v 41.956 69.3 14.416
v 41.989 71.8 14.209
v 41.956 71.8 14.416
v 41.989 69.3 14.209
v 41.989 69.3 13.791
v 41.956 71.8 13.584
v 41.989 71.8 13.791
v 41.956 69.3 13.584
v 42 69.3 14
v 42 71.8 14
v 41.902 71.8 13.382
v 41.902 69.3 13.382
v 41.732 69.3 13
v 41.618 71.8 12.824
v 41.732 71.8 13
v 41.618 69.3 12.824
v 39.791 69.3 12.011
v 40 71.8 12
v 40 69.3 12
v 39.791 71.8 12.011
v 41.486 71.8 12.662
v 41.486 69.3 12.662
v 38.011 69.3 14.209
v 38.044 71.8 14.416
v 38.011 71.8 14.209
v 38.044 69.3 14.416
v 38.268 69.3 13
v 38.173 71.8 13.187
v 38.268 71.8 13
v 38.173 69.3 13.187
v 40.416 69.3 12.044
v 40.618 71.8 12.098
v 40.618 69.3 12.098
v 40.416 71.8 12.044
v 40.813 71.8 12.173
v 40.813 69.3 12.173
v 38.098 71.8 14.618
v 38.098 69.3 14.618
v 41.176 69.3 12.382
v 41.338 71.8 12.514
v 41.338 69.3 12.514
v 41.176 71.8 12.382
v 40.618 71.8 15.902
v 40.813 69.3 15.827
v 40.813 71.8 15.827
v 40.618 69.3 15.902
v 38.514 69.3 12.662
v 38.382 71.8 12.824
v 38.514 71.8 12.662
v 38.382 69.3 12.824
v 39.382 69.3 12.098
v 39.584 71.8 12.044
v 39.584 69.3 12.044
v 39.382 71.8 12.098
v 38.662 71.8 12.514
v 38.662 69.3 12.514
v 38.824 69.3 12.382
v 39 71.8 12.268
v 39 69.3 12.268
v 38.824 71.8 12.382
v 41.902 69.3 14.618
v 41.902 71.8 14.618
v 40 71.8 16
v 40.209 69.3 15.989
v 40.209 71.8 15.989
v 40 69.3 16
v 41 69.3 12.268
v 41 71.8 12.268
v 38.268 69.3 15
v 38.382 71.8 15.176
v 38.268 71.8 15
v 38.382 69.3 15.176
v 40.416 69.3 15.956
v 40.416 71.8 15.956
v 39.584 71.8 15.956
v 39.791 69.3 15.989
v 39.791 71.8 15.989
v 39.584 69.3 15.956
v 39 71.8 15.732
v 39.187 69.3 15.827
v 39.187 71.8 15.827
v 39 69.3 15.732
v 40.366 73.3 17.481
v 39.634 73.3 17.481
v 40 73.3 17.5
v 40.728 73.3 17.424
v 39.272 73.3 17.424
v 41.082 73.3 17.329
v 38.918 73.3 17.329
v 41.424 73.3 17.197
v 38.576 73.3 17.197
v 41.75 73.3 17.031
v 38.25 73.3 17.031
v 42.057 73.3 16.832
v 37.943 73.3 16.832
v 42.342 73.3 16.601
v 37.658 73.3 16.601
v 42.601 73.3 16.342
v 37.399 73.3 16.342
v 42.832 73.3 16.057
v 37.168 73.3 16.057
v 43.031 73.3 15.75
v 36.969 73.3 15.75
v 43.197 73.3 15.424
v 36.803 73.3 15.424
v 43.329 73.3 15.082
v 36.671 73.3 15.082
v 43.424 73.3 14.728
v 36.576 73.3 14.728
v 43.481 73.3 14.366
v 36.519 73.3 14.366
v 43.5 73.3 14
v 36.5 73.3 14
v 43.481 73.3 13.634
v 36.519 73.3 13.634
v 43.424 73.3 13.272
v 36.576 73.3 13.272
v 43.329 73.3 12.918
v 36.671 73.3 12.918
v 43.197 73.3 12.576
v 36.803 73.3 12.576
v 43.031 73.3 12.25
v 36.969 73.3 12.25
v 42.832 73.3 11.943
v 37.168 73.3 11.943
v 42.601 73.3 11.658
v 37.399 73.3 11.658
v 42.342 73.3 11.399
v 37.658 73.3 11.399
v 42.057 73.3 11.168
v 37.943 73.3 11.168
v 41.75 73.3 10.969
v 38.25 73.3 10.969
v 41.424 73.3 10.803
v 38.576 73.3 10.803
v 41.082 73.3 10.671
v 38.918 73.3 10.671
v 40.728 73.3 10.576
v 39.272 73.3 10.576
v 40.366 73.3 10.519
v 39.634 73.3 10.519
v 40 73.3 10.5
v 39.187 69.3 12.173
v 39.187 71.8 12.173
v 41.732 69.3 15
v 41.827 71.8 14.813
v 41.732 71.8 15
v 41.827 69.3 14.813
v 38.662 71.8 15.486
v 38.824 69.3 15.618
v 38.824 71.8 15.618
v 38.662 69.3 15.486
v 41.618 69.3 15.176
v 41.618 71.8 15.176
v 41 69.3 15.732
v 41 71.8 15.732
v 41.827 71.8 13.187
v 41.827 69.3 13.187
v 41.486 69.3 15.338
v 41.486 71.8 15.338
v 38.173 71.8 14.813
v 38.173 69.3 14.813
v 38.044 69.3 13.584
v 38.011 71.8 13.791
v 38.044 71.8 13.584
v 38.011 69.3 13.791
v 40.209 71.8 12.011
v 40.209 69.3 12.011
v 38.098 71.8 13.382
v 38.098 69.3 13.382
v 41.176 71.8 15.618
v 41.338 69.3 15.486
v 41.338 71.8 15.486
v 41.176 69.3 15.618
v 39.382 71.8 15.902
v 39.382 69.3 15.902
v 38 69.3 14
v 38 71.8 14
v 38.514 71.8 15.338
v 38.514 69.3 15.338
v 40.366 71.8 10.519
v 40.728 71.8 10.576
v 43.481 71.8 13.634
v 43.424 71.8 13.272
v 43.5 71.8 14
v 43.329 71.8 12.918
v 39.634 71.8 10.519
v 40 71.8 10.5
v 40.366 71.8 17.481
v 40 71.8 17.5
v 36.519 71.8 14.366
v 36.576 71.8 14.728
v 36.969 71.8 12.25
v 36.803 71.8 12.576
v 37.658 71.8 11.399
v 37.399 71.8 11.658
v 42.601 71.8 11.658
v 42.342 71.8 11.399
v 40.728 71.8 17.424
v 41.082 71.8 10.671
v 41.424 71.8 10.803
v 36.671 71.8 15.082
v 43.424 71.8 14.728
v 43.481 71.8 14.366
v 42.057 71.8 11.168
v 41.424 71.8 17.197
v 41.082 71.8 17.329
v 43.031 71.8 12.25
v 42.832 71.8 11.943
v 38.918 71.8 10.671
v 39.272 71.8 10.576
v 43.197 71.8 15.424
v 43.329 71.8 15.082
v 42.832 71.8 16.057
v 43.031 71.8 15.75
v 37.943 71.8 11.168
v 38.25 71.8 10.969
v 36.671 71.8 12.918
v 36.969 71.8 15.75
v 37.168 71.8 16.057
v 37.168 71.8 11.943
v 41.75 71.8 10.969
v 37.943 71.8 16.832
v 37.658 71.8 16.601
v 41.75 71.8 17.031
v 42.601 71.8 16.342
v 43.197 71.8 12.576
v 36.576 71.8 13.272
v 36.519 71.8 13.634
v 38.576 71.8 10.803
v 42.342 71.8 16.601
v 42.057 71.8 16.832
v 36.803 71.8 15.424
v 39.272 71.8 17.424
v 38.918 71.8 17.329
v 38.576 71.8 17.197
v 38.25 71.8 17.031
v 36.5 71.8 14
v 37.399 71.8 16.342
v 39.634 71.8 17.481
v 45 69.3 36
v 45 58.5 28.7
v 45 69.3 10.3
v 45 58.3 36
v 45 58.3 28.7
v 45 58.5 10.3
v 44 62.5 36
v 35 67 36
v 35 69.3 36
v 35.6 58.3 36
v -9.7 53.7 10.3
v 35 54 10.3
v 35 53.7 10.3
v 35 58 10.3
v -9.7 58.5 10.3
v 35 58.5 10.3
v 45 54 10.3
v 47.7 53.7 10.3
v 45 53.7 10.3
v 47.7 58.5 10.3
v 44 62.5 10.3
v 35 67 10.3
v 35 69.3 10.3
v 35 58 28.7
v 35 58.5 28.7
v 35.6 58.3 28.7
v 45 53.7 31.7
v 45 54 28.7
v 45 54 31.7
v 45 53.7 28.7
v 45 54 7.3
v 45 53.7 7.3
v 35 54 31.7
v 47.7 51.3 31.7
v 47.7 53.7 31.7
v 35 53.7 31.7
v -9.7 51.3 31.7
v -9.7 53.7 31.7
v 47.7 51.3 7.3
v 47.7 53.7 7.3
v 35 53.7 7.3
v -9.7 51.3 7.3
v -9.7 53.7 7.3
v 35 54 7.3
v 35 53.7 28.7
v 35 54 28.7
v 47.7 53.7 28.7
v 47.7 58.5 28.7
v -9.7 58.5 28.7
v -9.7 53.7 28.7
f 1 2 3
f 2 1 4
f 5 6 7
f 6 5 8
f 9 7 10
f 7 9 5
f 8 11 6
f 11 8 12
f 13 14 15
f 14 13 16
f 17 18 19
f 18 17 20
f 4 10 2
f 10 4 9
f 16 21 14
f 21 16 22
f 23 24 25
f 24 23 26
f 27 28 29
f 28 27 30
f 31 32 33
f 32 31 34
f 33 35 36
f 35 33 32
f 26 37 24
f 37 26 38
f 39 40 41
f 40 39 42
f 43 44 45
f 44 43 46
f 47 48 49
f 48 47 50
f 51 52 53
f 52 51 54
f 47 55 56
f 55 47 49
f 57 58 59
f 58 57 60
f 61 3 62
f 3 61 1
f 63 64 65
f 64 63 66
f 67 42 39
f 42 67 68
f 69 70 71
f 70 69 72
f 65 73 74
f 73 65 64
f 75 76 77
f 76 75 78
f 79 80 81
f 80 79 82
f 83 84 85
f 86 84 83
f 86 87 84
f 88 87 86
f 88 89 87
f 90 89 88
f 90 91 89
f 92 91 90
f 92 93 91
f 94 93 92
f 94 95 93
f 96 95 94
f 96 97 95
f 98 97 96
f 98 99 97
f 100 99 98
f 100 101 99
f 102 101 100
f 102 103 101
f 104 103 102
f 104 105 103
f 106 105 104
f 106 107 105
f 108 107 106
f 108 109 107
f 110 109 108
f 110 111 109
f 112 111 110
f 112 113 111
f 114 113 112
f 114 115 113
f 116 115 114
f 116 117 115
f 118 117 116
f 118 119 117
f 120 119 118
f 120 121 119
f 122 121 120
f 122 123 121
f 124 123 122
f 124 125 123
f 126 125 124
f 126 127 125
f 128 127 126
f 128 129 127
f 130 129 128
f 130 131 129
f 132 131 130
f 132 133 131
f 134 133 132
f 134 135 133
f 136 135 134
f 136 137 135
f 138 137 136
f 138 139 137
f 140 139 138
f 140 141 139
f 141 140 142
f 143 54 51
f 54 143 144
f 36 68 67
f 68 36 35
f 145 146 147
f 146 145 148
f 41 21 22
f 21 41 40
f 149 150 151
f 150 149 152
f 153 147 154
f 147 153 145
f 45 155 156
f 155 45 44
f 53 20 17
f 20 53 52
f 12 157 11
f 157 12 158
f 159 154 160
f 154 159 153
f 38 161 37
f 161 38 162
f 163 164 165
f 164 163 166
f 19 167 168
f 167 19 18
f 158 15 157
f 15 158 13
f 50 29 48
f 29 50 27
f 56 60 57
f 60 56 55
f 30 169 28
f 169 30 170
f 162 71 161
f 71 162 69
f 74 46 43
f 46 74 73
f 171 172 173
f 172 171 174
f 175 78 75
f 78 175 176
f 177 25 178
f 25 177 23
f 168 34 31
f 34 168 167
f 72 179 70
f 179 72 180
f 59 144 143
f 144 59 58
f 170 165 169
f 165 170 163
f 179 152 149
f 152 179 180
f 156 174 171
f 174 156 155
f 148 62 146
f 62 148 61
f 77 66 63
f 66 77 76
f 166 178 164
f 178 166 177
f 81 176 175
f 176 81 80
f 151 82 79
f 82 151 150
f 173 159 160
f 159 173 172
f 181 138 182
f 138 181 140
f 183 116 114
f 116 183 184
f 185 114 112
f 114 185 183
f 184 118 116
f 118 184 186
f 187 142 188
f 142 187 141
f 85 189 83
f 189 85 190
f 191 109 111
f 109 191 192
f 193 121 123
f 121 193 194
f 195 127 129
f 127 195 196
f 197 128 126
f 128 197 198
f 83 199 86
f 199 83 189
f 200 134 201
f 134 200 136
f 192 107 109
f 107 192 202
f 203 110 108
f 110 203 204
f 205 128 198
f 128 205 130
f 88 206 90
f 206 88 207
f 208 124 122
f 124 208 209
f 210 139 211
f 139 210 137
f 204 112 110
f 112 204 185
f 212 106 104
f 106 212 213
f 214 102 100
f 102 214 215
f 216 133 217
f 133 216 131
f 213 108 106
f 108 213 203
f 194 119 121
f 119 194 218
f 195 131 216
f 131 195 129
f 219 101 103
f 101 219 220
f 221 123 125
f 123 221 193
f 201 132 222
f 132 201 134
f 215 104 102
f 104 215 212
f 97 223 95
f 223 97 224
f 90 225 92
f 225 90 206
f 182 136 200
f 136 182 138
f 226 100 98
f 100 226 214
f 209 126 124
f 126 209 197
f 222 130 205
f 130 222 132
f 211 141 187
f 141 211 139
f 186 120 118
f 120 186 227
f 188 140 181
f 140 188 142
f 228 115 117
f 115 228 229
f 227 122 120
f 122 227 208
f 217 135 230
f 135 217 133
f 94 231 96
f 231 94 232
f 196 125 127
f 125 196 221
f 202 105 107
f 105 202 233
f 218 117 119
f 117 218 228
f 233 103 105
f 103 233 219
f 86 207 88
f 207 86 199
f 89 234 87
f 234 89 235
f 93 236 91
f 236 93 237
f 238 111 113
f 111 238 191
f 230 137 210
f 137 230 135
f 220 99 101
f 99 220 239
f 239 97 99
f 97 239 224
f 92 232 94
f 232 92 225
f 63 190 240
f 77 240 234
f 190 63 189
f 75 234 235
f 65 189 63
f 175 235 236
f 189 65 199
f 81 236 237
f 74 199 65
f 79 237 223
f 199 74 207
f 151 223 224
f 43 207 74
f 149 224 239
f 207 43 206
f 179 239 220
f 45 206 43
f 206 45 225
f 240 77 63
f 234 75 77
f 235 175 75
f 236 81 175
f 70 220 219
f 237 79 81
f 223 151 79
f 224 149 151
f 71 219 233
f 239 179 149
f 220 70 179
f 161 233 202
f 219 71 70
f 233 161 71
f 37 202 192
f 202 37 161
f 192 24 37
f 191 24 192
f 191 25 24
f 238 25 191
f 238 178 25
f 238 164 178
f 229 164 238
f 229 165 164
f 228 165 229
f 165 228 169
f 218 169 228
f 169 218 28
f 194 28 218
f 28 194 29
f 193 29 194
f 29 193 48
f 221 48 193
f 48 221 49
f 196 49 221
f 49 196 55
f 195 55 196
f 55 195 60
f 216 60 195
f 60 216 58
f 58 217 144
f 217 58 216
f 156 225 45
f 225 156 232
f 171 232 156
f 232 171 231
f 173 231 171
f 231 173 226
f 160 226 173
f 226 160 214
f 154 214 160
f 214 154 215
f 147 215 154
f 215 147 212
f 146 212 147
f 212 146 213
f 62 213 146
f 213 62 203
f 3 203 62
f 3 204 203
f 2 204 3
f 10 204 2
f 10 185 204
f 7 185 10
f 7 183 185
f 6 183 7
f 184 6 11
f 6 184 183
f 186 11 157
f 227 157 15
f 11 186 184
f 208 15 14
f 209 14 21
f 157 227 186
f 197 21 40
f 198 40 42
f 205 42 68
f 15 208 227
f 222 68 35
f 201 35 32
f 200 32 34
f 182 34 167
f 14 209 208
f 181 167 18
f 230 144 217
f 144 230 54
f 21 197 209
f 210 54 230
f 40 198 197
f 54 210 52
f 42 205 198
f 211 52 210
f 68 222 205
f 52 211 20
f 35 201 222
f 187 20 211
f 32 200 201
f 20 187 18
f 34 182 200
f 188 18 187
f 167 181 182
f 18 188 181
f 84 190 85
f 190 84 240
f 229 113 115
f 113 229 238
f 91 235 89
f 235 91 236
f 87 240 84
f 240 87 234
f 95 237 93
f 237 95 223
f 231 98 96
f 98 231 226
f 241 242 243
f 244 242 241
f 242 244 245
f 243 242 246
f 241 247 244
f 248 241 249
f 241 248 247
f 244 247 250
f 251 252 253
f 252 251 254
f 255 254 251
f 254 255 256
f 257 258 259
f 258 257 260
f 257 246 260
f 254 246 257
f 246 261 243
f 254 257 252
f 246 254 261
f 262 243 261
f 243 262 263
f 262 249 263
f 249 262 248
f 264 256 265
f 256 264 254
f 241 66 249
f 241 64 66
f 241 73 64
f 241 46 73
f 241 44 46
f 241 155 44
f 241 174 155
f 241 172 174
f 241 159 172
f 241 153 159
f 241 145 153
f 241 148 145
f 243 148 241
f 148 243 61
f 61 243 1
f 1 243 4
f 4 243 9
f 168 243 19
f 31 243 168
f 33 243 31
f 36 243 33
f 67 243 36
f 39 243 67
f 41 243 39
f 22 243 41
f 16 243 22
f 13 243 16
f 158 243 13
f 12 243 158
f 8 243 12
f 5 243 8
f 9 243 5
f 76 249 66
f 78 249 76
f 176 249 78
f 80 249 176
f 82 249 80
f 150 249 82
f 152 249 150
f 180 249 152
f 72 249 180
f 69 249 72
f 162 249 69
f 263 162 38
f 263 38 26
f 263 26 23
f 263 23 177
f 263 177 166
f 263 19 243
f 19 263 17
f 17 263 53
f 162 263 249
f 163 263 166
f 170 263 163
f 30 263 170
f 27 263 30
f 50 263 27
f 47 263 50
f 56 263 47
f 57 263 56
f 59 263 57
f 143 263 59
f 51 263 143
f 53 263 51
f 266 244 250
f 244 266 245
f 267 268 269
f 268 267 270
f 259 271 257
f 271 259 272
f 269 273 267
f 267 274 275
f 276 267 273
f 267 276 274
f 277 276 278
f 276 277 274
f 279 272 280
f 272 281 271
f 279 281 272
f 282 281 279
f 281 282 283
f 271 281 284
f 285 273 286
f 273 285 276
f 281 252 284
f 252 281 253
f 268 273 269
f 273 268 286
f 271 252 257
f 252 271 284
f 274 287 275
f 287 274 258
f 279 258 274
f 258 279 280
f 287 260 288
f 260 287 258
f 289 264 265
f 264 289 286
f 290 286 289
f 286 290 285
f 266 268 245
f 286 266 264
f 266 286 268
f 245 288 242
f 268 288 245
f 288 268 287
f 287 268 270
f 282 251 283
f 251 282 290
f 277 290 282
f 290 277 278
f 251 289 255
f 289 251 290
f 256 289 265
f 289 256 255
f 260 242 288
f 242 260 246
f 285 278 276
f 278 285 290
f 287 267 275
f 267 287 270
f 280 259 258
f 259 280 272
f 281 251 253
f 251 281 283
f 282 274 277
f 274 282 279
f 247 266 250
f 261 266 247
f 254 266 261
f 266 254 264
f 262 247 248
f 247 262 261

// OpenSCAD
// file: lego_robot_common.scad
/* 
 * Parametric Lego-Compatible Robotic Vehicle Enclosure
 * Completely self-contained OpenSCAD script.
 */

$fn = 60;

// --- LEGO & ENCLOSURE PARAMETERS ---
lego_pitch = 8.0;
lego_height = 9.6;
wall_t = 1.6;        // thin end walls (front/back) for electronics clearance
side_wall = 8.0;     // long side walls: a full LEGO unit so the lid seats and
                     // Technic holes/motor mounts sit in solid wall

// Outer Dimensions. Shorter + taller (reorg): the ULN2003 boards stand on the
// inner side walls and the ESP32 lies between them, so the floor needs less
// length; the extra height lets the phone clamp grip higher.
box_w_lu = 12; // 96.0 mm (Outer Width)
box_l_lu = 12; // 96.0 mm (Outer Length, shortened from 128)
box_h_lh = 6;  // 57.6 mm (Outer Height, raised from 48)

width = box_w_lu * lego_pitch;
length = box_l_lu * lego_pitch;
height = box_h_lh * lego_height;

lid_t = 3.2; // Sliding lid thickness
floor_z = 4.8; // 3.2mm Lego tube cavity + 1.6mm floor
lid_z = height - 2.4; // centre Z of the sliding-lid rail groove (just below top)

// --- ALIGNED INTERNAL POSITIONS ---
shaft_z = 33.6; // motor shaft / coupler height
motor_y = 26.0; // front; keeps the front mounting ear (motor_y+17.5) inside the cavity
motor_z = shaft_z - 8.0;

// --- PHONE CLAMP T-SLOT (shared by the base cavity + the moving jaw tongue) ---
// Keeping these numbers in one place stops the two parts drifting out of
// sync -- a past edit shrank the cavity without updating the tongue to
// match, letting the tongue reach 20mm past the cavity into solid wall.
clamp_tol    = 0.3;        // per-side print clearance for the sliding tongue fit
slot_x0      = -10;        // T-slot cavity start (chassis X)
slot_x1      = width / 2;  // T-slot cavity end == chassis half-width
slot_neck_z0 = 10;  slot_neck_z1 = 29;  // neck cavity Z range (jaw slides here)
slot_uc_z0   = 7;   slot_uc_z1   = 32;  // undercut cavity Z range (T-flange lock)
shelf_top_z  = 8;          // V-lip shelf top surface -- jaw geometry must clear this
// Shared Z height for both band pegs (keeps rubber band level). Must clear
// the moving jaw's grip finger floor (slot_neck_z0 + clamp_tol = 10.3) by
// enough for the d=4 peg shaft (radius 2) to stay embedded in it.
band_peg_z   = 14;

// --- PRINTABILITY HELPERS ---
// Self-supporting "teardrop" profile for a horizontal round hole: circular
// for the bottom ~180-270 degrees (so a mating round part still fits/seats
// normally), pointed above that so no internal roof ever needs to bridge
// across the hole -- avoids drooping/support for holes above ~5-8mm, which
// plain horizontal cylinder() holes need past that size.
// Bores along X, apex always toward +Z regardless of s (+1 or -1), matching
// the translate/rotate([0, s*90, 0]) convention already used for the plain
// cylinder() holes elsewhere in this project.
module teardrop_hole(d, h, s = 1) {
    r = d / 2;
    a = r / sqrt(2); // circle's 45-degree point -- where the roof takes over
    rotate([0, 0, s * 90]) rotate([90, 0, 0])
        linear_extrude(h)
            union() {
                circle(d = d);
                polygon([[-a, a], [a, a], [0, r * sqrt(2)]]);
            }
}

// --- RENDER TARGET ---
// main file
include <lego_robot_common.scad>

// Adjustable RIGHT V-jaw for the horizontal phone clamp.
//
// Rides the T-slot on the front face of the chassis clamp-wall (y=48-58).
// Telescope right to load phone; slide left until V-notch grips right edge.
// T-tongue (neck + full undercut) locks the jaw in Y so it cannot pull
// forward — only slides in X along the rail. The tongue's X span is derived
// from slot_x0/slot_x1 (lego_robot_common.scad) minus clamp_tol, so it can
// never reach past the chassis's actual T-slot cavity into solid wall.
// Band peg on jaw front face: hook rubber band before inserting phone.
// Prints standing (tongue face down), no support needed.

module phone_clamp_jaw() {
    fy  = length / 2;    // chassis front wall inner face (y=48)
    tol = clamp_tol;     // print clearance per mating surface

    // Tongue spans the T-slot cavity width minus clearance, so it always
    // stays inside the milled cavity (see lego_robot_common.scad slot_x0/x1).
    tx0 = slot_x0 + tol;
    tx1 = slot_x1 - tol;
    tw  = tx1 - tx0;

    // Grip finger held clamp_tol proud of the wall face (y=58) so it can't
    // bind against it. Floored at the neck cavity's own floor (not just
    // shelf_top_z + tol) -- flooring it lower left a gap between the finger
    // and the neck (nothing connects them below z=10.3), which prints as an
    // unsupported floating island. Flooring it here also clears the V-lip
    // shelf with more margin than the minimum, not less.
    finger_y0 = 58 + tol;
    finger_z0 = slot_neck_z0 + tol;

    // Neck tongue's front edge is extended past the wall face (open air) far
    // enough to overlap the (now offset) grip finger, keeping the jaw as one
    // connected solid.
    neck_y0 = fy + 5.6;
    neck_y1 = finger_y0 + 0.2;

    difference() {
        union() {
            // Grip finger in front of wall.
            translate([35, finger_y0, finger_z0])
                cube([10, 11, 36 - finger_z0]);

            // Filler block: thickens the tongue/finger junction into a solid
            // corner. Kept within the undercut cavity's y-range (<=54) so it
            // never reaches into the shallower neck cavity above it.
            translate([35, 53.5, slot_uc_z0 + tol])
                cube([10, 0.5, slot_uc_z1 - slot_uc_z0 - 2*tol]);

            // ── T-tongue: extends left from jaw body, spans the T-slot width ──
            // Neck (fits in slot neck y=54-58, z=10-29):
            translate([tx0, neck_y0, slot_neck_z0 + tol])
                cube([tw, neck_y1 - neck_y0, slot_neck_z1 - slot_neck_z0 - 2*tol]);

            // Full-height undercut body (fills entire undercut y=51-54, z=7-32):
            translate([tx0, fy + 3 + tol, slot_uc_z0 + tol])
                cube([tw, 3 - 2*tol, slot_uc_z1 - slot_uc_z0 - 2*tol]);

            // Band peg: front face of jaw, visible from outside, 1mm inset
            // from the jaw's front face (finger_y0 + 11) — no T-junction.
            translate([40, finger_y0 + 10, band_peg_z]) rotate([-90, 0, 0]) {
                cylinder(d=4, h=5);
                translate([0, 0, 3.5]) cylinder(d=7, h=1.5);
            }
        }

        // V-notch grips phone's right edge (mirror of fixed jaw).
        // Base flush with jaw inner face x=+35 — no 1mm flat wall.
        translate([0, fy + 14.5, 0]) linear_extrude(45)
            polygon([[44, 0], [35, -4.5], [35, 4.5]]);
    }
}

color("#27ae60") phone_clamp_jaw();
